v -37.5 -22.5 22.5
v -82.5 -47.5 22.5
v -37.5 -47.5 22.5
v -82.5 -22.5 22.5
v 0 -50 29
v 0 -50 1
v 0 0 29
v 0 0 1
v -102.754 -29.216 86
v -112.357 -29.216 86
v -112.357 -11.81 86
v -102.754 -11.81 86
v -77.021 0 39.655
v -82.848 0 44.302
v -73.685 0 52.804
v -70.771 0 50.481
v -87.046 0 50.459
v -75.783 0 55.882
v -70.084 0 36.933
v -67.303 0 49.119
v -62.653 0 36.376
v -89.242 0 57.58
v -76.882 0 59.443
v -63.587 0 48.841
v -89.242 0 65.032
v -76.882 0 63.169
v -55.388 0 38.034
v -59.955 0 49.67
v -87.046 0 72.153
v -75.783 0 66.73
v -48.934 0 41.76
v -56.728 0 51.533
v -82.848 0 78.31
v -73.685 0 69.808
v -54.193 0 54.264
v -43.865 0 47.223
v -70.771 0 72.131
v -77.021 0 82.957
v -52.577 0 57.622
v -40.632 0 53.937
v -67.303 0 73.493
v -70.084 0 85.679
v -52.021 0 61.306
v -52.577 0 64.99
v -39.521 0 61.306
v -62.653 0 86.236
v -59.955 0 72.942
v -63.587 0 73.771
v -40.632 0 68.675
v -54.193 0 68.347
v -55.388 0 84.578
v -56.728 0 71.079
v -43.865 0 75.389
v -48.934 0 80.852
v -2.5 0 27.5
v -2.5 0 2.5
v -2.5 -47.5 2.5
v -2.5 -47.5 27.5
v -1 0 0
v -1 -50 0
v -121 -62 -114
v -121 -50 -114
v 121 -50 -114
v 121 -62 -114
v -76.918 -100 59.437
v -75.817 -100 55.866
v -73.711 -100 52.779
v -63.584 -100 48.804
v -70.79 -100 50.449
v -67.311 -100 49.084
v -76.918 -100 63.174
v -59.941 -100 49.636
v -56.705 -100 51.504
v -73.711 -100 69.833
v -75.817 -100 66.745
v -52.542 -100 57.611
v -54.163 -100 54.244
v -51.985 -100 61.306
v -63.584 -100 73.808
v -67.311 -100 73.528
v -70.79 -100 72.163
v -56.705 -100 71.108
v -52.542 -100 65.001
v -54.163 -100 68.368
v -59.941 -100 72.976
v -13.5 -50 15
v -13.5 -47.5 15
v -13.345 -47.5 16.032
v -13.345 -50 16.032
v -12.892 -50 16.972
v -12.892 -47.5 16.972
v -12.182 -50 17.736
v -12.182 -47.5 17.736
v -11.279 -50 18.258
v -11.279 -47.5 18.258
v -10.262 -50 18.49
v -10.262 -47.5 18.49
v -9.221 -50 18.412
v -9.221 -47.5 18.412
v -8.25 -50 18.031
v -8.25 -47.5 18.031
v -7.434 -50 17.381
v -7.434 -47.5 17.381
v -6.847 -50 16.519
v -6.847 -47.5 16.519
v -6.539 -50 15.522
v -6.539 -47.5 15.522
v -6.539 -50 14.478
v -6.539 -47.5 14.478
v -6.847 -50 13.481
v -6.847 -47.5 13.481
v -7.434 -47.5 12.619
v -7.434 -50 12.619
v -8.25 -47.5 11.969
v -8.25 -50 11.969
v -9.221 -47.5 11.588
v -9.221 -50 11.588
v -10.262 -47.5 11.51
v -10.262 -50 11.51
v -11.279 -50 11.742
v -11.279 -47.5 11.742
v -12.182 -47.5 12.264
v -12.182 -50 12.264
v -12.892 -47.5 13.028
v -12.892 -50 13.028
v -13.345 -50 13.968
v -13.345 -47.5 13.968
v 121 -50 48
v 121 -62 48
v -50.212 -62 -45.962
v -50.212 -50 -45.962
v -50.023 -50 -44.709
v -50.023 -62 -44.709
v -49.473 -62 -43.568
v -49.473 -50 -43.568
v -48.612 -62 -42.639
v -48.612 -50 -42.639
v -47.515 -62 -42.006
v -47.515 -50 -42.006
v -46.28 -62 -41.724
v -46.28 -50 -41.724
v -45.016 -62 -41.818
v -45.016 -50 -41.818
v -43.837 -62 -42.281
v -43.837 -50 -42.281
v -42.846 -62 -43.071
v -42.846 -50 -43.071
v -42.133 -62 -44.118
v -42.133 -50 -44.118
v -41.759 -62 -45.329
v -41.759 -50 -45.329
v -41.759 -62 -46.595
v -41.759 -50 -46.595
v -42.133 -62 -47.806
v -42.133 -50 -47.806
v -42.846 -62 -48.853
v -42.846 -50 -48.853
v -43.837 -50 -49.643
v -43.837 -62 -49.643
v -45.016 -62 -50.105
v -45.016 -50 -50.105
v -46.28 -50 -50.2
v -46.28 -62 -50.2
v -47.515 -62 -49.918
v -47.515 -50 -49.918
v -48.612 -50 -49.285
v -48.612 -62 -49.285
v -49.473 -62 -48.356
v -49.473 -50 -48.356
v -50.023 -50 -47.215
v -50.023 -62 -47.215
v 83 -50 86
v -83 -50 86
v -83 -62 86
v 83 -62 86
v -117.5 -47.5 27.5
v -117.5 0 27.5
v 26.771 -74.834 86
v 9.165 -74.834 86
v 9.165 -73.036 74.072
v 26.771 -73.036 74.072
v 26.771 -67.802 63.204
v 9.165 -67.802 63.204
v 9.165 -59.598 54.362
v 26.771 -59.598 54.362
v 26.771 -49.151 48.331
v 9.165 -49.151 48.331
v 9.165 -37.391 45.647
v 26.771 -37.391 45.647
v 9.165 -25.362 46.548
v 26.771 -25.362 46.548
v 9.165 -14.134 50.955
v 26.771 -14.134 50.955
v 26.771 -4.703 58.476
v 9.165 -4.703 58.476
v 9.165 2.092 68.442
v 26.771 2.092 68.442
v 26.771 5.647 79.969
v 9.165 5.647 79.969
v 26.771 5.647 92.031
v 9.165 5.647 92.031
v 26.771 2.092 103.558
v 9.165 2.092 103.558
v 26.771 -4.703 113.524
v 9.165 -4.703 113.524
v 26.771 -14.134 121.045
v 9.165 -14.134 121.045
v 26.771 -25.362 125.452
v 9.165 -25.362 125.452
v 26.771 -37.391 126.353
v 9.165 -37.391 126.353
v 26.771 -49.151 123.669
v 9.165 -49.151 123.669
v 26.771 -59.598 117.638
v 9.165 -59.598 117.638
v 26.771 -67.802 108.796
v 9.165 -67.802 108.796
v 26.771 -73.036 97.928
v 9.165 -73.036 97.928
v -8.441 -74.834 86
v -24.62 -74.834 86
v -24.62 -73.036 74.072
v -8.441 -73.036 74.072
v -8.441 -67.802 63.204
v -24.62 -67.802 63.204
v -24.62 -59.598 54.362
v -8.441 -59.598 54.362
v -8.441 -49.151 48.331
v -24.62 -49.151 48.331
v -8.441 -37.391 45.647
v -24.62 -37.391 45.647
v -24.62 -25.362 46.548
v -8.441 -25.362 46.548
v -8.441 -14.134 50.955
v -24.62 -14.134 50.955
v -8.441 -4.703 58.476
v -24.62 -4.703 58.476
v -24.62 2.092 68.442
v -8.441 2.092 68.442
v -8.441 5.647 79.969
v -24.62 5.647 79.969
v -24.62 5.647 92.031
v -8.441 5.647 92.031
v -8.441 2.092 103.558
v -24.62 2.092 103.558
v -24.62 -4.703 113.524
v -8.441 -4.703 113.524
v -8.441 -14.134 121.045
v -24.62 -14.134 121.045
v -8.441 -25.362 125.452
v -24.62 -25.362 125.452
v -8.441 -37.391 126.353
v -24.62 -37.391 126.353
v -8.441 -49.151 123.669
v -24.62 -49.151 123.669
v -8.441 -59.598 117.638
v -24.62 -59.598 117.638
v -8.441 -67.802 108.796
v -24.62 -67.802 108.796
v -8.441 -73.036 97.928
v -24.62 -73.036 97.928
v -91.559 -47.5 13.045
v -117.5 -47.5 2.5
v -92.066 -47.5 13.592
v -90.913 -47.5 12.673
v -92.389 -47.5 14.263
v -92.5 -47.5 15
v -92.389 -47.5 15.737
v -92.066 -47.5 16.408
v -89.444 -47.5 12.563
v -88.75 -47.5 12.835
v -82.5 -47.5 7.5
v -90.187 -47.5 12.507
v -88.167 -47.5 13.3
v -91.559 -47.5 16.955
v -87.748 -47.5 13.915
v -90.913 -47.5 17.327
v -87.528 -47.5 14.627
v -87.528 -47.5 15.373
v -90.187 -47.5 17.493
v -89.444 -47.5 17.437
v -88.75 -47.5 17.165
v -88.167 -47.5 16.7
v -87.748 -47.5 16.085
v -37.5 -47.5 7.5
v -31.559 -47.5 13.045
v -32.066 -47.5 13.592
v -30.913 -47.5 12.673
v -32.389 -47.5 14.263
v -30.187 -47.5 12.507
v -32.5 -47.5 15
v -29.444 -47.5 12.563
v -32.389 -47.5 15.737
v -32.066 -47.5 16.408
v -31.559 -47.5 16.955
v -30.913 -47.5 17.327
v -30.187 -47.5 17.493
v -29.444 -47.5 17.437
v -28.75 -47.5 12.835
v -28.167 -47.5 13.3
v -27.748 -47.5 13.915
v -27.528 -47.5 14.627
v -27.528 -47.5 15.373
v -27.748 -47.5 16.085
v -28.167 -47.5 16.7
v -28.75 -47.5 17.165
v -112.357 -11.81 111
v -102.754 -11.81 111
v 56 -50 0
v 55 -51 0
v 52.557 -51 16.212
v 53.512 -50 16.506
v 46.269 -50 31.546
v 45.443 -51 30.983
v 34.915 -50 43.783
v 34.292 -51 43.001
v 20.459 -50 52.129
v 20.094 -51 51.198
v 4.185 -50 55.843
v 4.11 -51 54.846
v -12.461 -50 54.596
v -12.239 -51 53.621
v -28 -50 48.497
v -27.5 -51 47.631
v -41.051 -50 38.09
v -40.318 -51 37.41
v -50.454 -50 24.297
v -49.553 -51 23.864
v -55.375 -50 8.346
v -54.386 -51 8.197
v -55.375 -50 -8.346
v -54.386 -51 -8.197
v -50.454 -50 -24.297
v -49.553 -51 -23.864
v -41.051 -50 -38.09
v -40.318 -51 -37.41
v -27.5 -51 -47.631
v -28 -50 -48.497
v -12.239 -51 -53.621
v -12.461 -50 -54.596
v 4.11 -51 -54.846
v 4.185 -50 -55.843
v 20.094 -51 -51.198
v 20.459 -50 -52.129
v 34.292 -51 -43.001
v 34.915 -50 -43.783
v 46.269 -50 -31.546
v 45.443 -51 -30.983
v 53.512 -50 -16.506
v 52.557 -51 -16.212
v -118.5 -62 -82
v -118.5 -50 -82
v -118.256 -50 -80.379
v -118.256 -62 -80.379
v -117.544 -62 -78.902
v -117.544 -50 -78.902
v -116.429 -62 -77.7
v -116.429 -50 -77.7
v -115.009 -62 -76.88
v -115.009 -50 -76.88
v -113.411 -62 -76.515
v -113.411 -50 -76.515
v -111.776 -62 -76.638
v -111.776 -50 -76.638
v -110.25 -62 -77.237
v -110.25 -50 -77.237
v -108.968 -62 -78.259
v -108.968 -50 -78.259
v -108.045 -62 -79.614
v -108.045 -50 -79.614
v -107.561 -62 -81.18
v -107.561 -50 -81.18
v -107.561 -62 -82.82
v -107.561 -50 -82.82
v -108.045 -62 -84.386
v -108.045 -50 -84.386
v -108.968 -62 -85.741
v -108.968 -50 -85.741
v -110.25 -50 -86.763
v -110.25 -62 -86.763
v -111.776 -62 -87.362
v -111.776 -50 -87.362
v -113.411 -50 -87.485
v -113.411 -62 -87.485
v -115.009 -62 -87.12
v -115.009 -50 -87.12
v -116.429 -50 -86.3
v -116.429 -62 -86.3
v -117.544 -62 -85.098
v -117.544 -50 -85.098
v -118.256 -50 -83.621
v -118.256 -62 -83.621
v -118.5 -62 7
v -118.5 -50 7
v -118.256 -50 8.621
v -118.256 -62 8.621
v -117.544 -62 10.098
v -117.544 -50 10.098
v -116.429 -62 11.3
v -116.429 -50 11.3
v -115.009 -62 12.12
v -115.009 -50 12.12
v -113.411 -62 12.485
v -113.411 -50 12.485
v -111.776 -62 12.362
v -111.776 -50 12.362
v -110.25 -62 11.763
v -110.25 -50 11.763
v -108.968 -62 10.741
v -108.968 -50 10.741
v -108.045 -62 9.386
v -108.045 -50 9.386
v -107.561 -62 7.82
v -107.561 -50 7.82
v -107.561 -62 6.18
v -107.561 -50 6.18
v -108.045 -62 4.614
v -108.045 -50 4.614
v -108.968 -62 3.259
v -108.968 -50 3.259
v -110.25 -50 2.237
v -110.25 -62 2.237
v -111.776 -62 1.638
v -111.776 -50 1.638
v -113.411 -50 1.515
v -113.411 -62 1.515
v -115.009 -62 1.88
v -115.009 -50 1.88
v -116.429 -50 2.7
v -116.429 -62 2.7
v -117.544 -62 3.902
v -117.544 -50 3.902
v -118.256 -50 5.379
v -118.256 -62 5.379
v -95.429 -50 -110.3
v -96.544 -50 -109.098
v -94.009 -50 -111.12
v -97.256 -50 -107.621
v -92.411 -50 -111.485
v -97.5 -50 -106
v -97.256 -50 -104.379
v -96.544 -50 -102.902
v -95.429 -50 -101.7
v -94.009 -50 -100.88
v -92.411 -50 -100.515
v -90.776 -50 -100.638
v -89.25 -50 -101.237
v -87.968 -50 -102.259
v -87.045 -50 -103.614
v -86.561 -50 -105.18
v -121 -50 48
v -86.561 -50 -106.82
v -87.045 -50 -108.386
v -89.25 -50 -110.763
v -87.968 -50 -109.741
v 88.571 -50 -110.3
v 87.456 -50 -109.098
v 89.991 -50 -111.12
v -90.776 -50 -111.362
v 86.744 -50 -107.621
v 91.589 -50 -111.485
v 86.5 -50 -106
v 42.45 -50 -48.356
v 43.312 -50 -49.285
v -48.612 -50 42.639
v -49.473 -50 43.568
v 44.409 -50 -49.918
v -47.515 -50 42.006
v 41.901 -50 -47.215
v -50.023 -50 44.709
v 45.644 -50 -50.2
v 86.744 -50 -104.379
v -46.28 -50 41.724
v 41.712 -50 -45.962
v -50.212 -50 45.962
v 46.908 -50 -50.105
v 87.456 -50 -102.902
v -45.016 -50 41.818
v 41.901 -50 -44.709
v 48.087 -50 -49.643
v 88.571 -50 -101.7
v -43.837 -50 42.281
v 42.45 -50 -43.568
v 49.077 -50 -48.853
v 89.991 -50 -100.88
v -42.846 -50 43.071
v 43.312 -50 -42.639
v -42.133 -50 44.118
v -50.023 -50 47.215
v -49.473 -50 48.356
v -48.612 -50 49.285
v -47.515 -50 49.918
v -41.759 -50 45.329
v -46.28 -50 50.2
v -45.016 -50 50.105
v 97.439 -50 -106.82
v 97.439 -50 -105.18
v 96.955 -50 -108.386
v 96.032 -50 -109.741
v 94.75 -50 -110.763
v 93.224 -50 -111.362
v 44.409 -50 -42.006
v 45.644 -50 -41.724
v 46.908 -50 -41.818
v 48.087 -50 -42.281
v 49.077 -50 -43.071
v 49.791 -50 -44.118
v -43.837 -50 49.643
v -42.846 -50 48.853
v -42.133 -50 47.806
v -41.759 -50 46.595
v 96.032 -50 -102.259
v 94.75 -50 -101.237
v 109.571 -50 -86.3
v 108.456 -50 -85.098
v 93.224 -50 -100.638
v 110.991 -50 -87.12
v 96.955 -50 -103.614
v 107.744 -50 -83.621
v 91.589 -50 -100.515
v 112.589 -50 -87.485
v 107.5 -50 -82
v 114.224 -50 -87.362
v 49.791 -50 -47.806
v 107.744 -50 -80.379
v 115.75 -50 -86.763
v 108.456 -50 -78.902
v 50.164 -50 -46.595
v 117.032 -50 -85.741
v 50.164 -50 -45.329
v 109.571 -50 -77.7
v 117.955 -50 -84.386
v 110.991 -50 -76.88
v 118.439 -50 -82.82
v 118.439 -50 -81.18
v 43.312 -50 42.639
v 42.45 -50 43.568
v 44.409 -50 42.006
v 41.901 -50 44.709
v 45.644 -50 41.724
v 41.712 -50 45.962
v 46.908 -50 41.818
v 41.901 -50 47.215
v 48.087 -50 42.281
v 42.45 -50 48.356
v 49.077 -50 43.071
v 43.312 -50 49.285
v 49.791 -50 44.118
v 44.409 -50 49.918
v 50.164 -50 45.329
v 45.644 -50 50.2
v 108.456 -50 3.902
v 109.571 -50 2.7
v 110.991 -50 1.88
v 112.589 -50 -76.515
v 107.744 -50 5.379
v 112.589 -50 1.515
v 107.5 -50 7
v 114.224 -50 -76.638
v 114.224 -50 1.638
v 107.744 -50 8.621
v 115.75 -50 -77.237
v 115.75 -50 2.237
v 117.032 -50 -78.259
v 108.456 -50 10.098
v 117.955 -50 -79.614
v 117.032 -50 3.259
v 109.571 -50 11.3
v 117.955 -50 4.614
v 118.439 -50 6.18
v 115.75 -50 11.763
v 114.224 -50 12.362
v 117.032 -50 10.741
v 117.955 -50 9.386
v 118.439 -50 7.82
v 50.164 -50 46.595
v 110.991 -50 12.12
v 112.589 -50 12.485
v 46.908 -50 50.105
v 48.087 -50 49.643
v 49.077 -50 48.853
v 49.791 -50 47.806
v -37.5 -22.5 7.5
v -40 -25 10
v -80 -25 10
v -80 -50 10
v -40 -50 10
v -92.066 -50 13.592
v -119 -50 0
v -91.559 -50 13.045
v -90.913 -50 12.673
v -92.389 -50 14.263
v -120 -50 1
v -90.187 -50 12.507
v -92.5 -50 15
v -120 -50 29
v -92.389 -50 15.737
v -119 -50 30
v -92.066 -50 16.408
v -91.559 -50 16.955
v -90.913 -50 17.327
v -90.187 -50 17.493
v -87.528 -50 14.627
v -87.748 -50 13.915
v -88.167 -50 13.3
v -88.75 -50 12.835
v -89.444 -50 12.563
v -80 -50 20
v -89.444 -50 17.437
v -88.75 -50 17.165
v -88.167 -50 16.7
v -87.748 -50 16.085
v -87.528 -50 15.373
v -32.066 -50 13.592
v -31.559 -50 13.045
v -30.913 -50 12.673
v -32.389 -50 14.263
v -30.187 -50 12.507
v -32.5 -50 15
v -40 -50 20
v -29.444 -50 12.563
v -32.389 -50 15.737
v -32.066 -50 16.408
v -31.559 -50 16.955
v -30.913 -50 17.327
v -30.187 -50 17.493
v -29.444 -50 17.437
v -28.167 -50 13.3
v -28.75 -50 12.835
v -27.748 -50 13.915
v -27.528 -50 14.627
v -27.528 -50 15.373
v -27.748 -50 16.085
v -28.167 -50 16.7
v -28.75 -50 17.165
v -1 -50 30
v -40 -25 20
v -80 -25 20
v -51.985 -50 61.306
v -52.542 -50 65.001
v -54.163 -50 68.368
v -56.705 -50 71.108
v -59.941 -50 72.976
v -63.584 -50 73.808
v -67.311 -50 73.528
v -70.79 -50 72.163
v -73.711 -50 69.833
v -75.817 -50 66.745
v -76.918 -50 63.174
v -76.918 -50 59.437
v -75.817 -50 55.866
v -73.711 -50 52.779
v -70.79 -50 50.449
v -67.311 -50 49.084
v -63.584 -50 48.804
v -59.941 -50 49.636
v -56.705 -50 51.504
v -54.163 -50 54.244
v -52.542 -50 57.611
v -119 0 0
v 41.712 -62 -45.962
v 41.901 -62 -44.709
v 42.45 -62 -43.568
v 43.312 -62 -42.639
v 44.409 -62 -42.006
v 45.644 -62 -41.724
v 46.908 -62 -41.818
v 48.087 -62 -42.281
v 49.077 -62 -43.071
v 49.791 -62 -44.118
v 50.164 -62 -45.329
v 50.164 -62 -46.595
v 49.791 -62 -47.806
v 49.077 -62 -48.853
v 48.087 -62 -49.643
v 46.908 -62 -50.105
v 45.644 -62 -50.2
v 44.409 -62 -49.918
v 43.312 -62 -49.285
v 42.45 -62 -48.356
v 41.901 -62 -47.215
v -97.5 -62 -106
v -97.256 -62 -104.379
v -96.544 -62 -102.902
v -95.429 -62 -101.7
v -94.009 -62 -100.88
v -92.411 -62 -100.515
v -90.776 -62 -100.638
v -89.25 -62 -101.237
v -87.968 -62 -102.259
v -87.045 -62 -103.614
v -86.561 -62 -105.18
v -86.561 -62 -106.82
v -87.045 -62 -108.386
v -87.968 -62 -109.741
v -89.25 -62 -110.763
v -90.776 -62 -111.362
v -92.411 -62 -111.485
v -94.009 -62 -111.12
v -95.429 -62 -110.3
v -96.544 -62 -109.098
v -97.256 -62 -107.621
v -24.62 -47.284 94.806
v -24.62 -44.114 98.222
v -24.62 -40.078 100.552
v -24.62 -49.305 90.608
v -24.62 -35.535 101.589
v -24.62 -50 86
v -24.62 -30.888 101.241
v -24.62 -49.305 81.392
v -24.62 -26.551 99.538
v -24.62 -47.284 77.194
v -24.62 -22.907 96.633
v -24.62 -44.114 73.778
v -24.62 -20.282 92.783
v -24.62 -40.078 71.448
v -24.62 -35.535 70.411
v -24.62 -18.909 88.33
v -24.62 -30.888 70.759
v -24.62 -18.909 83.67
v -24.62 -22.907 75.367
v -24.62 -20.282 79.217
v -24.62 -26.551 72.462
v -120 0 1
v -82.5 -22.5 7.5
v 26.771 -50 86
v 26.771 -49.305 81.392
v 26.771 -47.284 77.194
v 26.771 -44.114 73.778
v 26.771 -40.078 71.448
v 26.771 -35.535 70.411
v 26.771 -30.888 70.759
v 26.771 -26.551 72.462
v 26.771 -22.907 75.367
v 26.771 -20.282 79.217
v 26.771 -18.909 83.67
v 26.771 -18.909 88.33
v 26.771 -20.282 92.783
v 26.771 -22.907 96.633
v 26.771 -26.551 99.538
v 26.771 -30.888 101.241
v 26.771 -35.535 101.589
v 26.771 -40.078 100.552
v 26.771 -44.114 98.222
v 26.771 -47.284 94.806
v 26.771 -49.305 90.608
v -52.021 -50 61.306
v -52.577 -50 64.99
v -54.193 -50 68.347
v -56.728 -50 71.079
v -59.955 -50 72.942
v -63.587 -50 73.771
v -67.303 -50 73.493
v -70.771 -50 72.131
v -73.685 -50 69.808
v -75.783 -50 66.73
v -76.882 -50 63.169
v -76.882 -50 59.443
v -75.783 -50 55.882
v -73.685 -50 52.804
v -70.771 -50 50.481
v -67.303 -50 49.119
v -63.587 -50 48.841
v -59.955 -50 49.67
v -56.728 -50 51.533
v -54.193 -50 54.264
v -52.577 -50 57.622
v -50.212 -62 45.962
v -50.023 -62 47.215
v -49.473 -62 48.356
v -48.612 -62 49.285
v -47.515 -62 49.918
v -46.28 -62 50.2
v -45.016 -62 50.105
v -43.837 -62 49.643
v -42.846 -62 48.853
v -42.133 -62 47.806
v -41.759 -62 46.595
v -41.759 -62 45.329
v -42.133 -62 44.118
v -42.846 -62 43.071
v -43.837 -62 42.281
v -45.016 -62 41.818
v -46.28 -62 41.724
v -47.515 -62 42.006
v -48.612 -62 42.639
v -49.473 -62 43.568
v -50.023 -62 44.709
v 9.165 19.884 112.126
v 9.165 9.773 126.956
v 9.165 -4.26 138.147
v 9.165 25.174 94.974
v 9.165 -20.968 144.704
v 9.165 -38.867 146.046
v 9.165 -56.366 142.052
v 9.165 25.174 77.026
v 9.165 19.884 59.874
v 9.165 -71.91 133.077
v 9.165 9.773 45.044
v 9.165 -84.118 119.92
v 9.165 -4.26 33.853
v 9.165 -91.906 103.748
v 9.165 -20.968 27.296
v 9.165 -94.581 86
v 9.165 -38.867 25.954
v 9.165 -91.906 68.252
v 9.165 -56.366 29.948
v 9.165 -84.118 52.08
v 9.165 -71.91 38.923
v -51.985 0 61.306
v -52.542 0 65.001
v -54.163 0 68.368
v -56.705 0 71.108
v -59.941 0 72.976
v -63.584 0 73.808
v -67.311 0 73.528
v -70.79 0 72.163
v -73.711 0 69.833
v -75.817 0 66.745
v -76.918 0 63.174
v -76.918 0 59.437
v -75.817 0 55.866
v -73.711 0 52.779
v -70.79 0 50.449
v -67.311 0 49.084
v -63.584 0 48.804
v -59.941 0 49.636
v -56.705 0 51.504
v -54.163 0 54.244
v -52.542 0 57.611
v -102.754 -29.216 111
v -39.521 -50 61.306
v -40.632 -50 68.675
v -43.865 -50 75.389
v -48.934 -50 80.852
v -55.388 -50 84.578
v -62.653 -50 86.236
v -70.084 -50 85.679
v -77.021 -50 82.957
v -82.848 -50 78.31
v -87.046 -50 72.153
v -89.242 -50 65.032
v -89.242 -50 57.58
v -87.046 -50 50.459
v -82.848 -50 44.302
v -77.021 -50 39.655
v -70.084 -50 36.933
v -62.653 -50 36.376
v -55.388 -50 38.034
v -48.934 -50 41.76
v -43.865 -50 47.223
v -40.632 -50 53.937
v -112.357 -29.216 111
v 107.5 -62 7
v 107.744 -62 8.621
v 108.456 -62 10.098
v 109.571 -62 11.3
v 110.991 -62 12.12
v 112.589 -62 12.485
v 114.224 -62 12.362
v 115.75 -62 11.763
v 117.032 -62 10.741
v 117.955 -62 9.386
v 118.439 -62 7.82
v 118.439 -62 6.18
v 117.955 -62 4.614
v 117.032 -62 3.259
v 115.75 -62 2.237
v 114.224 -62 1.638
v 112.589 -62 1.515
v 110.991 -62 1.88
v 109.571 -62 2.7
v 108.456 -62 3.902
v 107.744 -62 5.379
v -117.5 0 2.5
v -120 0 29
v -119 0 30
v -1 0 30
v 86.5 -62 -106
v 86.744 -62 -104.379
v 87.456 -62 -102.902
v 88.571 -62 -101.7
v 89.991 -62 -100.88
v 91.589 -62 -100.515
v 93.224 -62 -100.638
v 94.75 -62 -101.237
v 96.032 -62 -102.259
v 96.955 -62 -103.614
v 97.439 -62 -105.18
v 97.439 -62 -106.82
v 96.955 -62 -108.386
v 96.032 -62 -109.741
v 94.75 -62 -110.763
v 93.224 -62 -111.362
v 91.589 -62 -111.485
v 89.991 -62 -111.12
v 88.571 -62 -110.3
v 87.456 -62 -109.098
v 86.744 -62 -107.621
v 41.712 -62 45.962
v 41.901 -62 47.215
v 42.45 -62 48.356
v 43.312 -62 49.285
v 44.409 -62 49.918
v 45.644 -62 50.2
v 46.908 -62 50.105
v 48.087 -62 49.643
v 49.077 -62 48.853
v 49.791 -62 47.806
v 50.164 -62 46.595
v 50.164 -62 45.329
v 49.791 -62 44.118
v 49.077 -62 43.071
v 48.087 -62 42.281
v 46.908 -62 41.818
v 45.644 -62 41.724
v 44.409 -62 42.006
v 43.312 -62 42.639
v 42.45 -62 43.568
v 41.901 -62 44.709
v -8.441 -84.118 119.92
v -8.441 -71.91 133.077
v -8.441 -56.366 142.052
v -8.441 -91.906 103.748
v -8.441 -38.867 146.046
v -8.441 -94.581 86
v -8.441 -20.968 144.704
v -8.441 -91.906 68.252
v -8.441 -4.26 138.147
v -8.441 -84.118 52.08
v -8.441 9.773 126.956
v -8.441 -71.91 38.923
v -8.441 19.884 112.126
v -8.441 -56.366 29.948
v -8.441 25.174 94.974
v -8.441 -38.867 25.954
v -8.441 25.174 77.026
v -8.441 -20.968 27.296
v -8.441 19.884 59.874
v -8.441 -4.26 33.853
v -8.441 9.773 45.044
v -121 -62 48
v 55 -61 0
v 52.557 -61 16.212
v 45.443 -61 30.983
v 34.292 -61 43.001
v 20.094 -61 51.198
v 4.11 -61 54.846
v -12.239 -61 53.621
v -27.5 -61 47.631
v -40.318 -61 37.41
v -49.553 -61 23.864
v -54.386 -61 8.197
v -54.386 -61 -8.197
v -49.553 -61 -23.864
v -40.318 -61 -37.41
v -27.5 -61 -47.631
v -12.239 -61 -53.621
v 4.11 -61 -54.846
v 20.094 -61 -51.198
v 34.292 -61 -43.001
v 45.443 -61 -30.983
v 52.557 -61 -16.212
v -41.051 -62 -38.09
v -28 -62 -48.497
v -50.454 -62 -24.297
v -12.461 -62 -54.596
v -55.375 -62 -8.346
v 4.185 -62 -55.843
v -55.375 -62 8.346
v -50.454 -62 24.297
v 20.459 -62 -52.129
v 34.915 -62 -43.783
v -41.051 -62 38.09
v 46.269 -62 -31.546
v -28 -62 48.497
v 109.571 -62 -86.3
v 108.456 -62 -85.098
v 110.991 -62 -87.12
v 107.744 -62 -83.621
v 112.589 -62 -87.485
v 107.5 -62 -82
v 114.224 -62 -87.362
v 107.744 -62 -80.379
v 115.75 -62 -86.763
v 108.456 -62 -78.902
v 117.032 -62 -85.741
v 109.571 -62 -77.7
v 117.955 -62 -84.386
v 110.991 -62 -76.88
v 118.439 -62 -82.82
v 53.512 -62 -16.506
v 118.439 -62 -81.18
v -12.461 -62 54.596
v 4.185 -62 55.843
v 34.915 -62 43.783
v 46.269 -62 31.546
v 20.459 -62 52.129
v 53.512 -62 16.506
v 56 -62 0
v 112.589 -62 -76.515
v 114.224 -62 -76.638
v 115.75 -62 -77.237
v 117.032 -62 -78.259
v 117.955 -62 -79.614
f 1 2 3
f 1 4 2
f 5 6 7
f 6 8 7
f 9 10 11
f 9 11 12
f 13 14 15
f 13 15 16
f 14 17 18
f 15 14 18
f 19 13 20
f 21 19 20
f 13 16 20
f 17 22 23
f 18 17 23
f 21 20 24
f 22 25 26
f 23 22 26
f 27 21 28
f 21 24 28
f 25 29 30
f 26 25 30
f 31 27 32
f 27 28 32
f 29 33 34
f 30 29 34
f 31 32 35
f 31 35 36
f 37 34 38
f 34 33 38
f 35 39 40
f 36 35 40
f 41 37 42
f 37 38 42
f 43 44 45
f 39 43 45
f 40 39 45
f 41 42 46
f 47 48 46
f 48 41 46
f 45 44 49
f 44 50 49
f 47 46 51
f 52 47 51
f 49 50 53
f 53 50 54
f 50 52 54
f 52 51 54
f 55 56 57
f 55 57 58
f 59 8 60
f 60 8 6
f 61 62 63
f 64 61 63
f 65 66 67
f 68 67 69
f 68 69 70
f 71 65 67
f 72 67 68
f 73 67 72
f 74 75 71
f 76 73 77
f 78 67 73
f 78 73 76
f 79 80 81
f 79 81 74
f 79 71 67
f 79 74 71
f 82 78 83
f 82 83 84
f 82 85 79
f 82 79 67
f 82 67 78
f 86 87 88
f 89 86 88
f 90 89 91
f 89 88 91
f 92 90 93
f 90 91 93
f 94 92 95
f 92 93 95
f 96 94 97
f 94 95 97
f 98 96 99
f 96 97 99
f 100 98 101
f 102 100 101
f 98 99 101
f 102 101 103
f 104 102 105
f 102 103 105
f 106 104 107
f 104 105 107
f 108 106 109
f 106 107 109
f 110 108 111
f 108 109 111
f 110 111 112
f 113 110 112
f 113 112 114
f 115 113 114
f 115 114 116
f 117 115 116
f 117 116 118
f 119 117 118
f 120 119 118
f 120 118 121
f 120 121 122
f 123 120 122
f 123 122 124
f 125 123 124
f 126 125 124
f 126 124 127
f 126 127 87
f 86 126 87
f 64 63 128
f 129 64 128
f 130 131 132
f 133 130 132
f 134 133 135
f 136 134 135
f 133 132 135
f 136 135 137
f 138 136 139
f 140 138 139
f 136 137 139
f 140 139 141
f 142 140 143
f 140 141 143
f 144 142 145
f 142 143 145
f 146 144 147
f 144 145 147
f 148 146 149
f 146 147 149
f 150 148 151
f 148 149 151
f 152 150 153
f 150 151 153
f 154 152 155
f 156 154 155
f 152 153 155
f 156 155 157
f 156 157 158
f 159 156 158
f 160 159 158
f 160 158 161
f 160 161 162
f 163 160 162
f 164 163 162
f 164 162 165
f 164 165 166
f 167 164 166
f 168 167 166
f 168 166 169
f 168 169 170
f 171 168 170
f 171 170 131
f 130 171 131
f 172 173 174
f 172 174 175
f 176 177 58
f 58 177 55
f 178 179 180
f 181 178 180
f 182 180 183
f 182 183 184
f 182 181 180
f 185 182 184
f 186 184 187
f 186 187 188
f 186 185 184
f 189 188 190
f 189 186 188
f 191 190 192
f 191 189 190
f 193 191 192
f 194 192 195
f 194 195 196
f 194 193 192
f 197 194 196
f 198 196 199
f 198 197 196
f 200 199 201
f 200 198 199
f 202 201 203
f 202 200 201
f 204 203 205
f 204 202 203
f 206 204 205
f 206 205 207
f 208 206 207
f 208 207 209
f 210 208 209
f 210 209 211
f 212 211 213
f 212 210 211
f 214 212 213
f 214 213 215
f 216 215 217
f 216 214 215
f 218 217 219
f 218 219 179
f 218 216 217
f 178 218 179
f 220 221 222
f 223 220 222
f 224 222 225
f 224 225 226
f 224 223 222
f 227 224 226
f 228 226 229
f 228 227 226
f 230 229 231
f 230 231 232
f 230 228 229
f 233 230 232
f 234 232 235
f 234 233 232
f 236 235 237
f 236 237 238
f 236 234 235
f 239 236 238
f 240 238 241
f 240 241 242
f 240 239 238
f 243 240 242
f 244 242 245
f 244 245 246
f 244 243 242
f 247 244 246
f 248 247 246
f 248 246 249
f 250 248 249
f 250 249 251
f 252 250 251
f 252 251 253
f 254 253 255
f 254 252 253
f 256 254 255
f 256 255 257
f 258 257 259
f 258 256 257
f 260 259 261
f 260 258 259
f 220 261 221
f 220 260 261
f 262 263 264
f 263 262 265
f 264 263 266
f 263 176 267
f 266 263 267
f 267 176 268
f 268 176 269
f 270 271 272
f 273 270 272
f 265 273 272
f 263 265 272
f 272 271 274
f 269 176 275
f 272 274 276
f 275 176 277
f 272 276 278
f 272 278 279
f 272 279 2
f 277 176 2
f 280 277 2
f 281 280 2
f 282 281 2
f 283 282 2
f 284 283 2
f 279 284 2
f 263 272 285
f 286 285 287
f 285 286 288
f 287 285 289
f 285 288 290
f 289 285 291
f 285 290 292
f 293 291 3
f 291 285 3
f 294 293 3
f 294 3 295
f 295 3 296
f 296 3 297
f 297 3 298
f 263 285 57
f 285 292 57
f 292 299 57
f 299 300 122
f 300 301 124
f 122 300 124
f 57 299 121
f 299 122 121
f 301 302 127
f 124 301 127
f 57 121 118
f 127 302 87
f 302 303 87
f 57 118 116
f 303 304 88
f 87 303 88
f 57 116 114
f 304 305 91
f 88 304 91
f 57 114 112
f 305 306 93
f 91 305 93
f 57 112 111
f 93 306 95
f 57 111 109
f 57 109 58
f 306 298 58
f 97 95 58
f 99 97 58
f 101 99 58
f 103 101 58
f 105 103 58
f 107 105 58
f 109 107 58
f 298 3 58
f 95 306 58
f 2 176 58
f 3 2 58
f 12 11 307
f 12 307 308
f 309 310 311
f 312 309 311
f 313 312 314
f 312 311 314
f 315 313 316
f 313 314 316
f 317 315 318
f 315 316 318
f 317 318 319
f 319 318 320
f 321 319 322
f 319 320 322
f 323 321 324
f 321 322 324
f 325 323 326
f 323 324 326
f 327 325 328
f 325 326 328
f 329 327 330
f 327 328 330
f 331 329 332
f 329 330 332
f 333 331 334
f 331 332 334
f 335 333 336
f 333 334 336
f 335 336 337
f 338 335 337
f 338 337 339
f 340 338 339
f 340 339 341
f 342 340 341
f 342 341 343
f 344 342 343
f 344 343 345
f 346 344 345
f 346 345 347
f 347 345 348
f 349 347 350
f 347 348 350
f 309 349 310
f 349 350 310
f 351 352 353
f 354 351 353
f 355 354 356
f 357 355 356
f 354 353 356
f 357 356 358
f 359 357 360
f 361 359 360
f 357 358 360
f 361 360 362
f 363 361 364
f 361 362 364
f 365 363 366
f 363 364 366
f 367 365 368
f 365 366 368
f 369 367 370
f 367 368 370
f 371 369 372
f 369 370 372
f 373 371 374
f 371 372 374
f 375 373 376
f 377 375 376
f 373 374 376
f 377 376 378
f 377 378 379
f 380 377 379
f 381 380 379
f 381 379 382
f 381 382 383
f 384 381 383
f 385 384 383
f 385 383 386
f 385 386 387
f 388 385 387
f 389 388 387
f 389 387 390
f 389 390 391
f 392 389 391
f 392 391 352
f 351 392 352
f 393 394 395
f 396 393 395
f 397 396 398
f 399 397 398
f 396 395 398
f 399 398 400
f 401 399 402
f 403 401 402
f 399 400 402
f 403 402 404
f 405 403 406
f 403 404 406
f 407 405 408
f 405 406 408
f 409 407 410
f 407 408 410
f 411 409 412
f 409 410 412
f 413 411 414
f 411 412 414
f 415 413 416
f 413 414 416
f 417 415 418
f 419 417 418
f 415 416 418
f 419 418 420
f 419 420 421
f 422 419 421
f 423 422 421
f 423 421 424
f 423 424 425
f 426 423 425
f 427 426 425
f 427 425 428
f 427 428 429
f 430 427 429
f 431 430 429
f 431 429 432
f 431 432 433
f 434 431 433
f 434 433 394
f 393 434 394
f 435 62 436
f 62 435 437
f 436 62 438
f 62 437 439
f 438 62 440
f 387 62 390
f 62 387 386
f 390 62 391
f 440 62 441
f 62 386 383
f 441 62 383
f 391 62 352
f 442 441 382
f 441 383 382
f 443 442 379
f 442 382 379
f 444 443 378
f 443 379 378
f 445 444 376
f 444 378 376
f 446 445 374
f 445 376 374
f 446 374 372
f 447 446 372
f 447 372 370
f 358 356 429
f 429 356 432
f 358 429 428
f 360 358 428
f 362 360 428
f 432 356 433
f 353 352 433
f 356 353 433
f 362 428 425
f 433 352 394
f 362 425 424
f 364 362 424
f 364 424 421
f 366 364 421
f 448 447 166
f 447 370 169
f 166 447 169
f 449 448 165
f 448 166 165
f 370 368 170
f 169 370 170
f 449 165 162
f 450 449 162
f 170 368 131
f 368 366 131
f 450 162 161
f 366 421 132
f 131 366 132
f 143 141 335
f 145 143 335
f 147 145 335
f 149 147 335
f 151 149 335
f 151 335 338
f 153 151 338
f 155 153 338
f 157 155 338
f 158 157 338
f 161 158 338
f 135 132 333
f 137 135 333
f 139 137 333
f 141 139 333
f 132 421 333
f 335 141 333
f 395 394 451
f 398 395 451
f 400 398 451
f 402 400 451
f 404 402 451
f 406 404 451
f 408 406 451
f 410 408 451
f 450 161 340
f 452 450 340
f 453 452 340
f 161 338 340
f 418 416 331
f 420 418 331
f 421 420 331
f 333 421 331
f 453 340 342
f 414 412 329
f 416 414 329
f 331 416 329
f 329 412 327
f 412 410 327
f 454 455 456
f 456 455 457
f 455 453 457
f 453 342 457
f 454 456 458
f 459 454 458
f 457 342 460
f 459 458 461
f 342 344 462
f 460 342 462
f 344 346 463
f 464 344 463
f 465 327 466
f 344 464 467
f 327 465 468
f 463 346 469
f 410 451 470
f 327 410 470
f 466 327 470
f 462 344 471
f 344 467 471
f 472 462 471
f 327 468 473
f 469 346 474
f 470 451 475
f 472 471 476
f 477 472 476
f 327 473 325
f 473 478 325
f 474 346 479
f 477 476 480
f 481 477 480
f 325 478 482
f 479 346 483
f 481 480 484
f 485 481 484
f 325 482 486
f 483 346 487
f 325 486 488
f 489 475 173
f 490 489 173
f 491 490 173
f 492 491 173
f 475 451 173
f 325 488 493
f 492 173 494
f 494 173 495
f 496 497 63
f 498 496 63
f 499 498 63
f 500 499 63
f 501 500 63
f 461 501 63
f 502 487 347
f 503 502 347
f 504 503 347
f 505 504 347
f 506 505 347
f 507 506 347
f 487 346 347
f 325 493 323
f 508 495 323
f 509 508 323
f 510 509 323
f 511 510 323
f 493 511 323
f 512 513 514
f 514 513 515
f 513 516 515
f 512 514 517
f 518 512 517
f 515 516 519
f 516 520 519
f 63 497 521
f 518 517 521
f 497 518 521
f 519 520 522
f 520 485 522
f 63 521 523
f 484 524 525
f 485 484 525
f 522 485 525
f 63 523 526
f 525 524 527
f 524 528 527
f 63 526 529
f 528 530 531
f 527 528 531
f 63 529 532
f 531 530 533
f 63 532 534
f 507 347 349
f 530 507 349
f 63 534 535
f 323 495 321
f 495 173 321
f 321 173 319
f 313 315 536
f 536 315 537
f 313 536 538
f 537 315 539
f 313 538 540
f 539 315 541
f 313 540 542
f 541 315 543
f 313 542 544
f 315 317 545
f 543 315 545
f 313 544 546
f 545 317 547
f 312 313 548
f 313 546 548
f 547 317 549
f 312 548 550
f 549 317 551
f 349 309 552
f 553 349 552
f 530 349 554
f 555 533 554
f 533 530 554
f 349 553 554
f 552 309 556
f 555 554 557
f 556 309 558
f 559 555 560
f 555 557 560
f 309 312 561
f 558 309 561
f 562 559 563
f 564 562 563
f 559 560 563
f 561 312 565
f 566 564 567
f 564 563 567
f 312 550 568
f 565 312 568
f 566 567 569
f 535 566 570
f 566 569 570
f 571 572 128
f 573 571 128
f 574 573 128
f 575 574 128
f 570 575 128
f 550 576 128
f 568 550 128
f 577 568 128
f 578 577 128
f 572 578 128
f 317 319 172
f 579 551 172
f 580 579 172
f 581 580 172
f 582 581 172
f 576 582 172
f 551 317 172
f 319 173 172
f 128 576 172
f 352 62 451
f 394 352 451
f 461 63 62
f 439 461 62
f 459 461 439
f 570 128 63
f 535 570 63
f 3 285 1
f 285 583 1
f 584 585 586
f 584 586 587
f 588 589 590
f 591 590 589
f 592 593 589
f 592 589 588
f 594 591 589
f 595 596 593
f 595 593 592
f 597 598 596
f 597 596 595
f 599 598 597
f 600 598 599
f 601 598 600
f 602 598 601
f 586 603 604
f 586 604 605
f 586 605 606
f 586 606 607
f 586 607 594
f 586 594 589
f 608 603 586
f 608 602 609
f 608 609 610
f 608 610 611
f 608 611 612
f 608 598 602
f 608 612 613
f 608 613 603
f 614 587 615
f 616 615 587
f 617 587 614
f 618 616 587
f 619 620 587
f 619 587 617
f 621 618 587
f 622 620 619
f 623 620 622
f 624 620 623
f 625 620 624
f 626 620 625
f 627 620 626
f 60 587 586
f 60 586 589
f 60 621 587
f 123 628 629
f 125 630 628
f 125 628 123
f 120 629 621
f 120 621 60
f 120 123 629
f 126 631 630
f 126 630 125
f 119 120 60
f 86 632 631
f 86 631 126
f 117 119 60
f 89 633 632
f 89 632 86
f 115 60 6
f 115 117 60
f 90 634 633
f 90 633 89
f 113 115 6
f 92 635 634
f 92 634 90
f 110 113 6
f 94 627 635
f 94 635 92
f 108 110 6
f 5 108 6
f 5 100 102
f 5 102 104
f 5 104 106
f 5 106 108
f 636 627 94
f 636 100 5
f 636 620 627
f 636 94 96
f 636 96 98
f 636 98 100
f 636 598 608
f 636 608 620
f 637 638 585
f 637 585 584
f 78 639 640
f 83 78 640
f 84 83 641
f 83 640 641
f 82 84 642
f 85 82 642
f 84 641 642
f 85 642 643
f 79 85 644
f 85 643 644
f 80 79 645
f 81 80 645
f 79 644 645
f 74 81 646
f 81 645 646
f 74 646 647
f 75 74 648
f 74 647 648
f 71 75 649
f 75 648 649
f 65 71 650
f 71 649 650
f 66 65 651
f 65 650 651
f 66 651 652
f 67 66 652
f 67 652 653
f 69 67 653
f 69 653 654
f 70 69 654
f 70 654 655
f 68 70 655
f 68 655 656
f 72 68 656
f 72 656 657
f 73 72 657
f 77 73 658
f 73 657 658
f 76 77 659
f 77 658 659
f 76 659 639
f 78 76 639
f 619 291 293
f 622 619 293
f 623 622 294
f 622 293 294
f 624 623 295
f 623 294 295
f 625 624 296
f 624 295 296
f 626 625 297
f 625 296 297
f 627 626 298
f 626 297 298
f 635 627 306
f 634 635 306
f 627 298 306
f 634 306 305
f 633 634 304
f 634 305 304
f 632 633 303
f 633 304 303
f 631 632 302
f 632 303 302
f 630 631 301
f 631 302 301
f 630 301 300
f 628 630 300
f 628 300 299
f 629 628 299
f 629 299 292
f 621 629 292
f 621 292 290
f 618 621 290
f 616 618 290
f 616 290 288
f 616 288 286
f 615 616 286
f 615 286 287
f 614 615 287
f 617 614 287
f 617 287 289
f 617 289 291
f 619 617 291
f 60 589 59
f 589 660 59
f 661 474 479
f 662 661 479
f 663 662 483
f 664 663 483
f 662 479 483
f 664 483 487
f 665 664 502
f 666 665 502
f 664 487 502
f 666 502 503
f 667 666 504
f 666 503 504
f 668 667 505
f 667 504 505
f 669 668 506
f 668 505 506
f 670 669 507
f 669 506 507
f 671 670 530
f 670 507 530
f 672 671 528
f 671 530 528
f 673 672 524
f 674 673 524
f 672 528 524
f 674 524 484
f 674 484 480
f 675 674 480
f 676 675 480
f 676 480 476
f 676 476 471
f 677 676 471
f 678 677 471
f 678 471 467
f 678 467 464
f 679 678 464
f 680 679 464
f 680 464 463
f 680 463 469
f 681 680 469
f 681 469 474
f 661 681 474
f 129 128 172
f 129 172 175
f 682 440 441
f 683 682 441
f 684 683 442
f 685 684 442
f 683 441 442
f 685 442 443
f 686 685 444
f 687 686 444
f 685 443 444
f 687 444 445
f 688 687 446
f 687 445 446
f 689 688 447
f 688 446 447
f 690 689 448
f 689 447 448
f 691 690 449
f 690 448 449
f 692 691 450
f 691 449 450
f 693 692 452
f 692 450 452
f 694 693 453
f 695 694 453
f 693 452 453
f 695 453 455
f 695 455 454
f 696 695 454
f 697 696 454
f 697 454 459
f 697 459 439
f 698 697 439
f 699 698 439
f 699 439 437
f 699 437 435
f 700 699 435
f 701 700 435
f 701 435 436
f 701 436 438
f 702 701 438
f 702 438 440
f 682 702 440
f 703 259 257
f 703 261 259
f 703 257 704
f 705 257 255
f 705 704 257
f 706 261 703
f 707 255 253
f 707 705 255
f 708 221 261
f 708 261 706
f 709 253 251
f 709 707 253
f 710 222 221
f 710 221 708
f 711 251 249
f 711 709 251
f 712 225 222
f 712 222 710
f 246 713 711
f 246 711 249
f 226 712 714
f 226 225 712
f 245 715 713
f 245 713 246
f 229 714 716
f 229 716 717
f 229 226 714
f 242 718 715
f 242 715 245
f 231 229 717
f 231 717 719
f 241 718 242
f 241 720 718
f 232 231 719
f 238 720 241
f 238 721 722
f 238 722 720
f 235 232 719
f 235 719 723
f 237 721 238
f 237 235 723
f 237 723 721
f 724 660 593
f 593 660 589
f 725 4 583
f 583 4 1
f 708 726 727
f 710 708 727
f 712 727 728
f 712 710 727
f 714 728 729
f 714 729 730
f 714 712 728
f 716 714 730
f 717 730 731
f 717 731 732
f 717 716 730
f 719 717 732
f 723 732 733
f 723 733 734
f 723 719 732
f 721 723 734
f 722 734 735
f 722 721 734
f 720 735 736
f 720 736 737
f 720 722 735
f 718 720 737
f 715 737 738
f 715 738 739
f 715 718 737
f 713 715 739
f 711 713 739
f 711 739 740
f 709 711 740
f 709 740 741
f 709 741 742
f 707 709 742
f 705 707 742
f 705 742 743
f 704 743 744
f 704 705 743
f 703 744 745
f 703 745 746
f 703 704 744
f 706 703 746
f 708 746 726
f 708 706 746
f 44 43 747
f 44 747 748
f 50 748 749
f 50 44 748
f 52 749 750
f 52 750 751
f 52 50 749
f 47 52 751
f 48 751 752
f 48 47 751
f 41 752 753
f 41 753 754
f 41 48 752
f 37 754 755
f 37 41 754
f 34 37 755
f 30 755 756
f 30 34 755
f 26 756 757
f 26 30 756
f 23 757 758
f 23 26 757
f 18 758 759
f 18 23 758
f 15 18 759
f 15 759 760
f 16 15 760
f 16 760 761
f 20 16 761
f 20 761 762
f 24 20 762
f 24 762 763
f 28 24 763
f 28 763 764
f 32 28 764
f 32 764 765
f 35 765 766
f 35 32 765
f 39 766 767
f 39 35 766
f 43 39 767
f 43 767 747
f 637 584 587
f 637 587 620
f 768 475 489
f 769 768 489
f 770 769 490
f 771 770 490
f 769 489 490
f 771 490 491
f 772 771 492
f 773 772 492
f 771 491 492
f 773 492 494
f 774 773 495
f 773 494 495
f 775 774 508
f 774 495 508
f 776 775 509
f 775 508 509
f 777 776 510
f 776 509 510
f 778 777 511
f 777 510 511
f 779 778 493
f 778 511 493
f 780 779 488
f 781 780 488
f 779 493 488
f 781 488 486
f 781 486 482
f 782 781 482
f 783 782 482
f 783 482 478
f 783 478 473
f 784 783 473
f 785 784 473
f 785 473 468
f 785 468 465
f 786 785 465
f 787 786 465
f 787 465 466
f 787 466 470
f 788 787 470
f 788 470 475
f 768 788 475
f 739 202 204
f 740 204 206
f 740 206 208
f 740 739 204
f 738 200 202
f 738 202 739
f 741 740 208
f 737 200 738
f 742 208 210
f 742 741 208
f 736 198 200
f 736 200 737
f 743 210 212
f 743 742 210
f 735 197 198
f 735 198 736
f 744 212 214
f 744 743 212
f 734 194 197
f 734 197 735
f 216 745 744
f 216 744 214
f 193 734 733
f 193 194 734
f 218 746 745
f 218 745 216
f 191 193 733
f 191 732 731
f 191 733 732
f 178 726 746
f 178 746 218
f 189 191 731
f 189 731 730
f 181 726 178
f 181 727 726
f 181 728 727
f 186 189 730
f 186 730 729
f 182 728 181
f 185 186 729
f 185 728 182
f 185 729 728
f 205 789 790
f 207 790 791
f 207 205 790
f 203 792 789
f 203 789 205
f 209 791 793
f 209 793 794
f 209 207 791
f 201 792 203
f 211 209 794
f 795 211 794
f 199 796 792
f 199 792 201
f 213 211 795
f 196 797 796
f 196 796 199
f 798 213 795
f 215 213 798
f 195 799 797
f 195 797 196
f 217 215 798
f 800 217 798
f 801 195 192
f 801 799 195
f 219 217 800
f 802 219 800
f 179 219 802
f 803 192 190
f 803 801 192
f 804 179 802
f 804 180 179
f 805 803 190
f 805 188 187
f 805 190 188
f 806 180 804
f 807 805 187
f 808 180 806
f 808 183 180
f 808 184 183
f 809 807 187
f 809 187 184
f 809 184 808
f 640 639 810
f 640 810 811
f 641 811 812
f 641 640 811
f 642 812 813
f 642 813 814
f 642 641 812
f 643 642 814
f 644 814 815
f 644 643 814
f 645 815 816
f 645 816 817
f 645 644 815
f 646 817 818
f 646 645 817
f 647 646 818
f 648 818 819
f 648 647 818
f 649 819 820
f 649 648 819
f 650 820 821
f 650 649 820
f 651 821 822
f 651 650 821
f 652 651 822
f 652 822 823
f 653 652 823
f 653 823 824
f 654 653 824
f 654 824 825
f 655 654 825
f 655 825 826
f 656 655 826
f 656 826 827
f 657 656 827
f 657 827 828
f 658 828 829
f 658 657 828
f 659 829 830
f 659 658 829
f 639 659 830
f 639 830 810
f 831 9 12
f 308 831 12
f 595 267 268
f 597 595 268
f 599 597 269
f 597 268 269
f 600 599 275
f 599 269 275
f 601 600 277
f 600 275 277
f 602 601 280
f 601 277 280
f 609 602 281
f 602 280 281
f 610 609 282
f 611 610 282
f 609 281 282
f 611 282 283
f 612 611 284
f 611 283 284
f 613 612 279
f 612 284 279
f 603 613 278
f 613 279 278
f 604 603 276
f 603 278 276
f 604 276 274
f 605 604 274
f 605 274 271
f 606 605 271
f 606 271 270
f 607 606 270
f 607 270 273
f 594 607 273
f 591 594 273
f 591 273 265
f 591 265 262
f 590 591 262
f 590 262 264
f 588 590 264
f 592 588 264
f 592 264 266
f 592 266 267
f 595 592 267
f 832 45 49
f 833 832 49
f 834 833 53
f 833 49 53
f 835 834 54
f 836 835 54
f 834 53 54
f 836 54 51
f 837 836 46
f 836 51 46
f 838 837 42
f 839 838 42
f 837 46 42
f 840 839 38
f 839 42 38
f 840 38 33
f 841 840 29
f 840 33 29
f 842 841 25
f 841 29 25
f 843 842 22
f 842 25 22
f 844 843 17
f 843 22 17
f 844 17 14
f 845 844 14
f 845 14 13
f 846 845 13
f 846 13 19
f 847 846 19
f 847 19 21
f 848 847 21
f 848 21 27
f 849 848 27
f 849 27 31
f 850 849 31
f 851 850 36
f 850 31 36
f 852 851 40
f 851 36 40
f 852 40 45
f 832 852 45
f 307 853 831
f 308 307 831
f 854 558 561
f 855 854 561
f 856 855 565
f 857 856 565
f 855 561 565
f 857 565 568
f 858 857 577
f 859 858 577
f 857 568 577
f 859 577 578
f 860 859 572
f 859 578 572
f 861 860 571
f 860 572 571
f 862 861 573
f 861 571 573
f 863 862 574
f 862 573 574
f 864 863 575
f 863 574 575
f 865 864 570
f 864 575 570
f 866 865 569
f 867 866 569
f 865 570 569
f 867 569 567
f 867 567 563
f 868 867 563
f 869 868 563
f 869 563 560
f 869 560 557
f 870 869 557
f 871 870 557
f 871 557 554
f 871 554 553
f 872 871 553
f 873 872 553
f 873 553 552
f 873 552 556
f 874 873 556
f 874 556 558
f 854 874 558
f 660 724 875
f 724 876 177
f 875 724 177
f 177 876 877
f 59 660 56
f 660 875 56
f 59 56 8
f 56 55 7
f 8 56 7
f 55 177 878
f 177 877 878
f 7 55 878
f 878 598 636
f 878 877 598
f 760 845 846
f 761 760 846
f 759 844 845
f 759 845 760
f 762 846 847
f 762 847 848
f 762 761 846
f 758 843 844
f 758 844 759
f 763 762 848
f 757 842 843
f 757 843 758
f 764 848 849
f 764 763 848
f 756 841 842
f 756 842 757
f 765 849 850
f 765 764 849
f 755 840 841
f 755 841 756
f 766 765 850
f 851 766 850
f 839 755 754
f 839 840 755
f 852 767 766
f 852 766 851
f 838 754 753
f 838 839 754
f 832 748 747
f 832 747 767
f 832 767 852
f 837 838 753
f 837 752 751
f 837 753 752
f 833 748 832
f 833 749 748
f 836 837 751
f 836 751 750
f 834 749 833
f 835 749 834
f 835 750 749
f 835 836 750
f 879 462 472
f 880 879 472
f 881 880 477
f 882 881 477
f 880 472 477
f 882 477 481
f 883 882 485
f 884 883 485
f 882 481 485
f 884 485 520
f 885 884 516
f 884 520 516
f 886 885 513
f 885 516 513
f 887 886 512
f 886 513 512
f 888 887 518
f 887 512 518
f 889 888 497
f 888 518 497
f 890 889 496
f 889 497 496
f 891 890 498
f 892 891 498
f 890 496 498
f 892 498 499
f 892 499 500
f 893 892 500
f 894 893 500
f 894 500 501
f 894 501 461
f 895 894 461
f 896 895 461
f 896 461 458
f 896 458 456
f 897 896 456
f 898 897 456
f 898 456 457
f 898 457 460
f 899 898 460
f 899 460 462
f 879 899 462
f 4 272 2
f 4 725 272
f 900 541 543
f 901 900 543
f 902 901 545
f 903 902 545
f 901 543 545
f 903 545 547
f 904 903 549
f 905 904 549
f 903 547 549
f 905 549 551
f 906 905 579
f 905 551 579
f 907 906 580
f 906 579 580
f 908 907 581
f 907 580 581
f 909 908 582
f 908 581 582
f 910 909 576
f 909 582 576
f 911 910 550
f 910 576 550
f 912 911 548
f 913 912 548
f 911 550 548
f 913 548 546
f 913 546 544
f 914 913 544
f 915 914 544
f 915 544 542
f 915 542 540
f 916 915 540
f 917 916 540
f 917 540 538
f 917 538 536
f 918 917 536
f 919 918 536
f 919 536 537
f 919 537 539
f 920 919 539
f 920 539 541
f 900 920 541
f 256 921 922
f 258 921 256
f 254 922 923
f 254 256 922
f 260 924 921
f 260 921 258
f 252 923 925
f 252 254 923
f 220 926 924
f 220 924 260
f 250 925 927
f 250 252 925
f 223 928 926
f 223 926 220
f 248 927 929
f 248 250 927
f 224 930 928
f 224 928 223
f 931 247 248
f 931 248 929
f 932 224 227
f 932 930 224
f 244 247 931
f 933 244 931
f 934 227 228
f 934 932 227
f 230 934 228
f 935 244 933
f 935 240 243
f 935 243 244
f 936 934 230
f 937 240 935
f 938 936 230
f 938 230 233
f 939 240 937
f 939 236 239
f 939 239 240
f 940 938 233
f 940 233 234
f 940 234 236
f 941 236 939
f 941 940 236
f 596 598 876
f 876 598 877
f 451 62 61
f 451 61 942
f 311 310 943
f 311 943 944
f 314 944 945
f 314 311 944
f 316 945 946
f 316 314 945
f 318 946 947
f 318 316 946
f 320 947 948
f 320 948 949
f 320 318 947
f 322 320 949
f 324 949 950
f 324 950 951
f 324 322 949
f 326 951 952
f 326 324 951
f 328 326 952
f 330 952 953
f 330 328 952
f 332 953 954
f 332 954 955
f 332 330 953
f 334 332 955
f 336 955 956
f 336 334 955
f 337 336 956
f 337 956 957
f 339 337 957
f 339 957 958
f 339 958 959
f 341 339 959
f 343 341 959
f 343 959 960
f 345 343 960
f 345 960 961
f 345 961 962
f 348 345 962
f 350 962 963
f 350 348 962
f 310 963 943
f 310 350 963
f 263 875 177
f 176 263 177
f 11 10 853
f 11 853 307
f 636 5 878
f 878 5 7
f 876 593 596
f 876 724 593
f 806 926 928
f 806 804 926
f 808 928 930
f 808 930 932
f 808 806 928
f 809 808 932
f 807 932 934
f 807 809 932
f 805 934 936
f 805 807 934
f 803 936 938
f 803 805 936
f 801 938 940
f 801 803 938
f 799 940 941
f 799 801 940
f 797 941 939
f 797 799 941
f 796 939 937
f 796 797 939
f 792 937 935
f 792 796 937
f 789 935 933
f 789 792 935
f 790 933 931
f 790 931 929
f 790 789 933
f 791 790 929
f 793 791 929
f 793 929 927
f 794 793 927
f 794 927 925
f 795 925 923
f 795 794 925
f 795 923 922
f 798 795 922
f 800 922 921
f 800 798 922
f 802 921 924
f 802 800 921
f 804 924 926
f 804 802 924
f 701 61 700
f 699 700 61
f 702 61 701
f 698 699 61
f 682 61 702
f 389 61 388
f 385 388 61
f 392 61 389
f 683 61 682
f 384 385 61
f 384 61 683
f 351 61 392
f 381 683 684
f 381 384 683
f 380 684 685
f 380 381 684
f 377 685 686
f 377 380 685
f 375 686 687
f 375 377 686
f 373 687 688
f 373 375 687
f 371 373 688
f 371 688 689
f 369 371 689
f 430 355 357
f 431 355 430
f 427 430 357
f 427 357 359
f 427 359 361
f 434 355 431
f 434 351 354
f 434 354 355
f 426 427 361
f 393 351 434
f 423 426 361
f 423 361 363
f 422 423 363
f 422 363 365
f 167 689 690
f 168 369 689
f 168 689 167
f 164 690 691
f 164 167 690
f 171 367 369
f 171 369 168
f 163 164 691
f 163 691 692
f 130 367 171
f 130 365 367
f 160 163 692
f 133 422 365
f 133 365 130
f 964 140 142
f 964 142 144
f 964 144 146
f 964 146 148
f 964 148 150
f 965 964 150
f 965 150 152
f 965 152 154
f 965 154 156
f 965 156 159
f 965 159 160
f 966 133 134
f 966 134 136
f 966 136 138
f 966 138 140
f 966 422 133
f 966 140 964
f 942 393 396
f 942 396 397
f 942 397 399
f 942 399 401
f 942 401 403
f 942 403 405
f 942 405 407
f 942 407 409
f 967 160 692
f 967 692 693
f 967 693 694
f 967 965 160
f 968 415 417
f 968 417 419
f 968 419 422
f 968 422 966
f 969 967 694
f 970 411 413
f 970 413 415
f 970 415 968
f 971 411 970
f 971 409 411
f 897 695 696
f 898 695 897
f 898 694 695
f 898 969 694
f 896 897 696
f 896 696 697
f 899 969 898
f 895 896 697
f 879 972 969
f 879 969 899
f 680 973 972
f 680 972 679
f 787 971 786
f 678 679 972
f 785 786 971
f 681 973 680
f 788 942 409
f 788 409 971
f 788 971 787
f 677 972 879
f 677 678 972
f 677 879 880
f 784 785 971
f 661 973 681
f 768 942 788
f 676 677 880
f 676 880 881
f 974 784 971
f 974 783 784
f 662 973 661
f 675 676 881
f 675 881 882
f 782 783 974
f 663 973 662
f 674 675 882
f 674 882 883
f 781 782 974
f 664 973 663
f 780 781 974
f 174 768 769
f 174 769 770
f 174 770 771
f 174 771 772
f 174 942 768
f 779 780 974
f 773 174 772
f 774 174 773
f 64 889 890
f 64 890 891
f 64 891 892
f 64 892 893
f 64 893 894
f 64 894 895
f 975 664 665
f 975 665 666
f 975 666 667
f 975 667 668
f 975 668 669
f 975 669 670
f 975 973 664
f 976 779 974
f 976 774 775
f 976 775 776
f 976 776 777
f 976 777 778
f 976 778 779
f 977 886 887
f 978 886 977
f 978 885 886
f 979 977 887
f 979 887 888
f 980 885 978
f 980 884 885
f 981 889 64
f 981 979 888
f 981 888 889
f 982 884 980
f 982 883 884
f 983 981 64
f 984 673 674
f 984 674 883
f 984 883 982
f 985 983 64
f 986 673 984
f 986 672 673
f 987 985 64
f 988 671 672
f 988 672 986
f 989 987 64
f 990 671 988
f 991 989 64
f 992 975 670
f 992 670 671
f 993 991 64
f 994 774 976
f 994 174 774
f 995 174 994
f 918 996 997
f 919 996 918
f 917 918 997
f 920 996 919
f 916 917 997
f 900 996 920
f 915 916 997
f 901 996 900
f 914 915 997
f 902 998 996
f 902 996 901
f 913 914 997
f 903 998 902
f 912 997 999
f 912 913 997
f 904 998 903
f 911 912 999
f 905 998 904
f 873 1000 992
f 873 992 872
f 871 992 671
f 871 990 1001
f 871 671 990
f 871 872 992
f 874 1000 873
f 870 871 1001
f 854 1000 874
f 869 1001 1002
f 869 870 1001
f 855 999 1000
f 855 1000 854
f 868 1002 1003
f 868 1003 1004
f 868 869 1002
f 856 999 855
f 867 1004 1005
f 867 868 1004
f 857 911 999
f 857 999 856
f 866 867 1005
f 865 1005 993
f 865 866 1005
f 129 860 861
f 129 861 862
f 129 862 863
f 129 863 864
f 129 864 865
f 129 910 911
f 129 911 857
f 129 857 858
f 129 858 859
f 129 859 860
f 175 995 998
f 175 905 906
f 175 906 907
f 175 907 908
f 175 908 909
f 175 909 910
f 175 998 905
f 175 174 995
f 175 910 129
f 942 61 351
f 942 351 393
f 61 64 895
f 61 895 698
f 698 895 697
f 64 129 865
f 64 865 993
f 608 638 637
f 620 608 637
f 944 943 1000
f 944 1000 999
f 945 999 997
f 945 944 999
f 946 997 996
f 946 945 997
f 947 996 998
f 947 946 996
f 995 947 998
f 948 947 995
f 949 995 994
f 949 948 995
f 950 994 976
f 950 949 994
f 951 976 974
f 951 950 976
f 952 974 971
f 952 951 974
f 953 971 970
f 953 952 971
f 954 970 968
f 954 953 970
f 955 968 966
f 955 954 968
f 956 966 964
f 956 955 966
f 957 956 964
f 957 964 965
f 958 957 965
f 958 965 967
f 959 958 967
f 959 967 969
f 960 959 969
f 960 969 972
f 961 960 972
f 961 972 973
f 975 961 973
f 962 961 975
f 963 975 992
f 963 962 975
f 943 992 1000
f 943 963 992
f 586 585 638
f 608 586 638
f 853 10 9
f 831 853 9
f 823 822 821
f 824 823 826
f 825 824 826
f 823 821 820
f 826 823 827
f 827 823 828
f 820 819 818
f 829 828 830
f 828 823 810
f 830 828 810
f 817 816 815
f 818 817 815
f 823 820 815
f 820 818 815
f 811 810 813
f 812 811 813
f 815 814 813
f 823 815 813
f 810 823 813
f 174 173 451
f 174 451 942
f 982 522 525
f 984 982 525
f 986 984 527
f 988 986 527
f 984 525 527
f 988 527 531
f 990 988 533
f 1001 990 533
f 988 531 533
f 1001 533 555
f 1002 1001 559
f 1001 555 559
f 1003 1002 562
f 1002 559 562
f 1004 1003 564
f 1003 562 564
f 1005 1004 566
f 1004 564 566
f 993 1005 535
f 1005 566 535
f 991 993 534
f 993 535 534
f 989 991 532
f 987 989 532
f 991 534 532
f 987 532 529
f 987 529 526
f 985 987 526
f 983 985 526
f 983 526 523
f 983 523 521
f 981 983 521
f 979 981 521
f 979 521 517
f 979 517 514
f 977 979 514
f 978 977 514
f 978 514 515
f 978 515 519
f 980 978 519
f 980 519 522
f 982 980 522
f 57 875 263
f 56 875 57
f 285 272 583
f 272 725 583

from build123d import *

# Parameters (mm, degrees)
F0_W           = 120
F0_H           = 30
F1_DEPTH       = 25
F2_W           = 120
F2_H           = 30
F2_W_2         = 40
F2_H_2         = 10
F3_DEPTH       = 25
F4_T           = -2.5
F6_D           = 5
F7_D           = 7
F8_SIZE        = 1
F9_R           = 25
F9_R_2         = 12.5
F10_DEPTH      = 50
F13_R          = 12.5366828167
F14_DEPTH      = 50
F14_DEPTH_BACK = 50
F15_W          = 242
F15_H          = 200
F15_R          = 55
F16_DEPTH      = 12
F17_SIZE       = 38
F19_D          = 8.5
F21_D          = 11
F22_SIZE       = 1
F23_W          = 9.6032470465
F23_H          = 17.4058834091
F24_DEPTH      = 25


with BuildPart() as f1:
    # F0 (on Front) → F1 (new body)
    with BuildSketch(Plane.XZ):
        with Locations((-60, 15)):
            Rectangle(F0_W, F0_H)
    extrude(amount=F1_DEPTH)

    # F2 (on face) → F3 (join)
    with BuildSketch(Plane.XZ.offset(25)):
        with Locations((-60, 15)):
            Rectangle(F2_W, F2_H)
        with Locations((-60, 15)):
            Rectangle(F2_W_2, F2_H_2, mode=Mode.SUBTRACT)
    extrude(amount=F3_DEPTH)

    # F4
    f4_openings = [f1.faces().sort_by_distance(p)[0] for p in [
        (-60, 0, 15),
    ]]
    offset(amount=F4_T, openings=f4_openings, kind=Kind.INTERSECTION)

    # F6 (through all)
    with Locations(Plane.XZ.offset(50)):
        with Locations((-90, 15), (-30, 15)):
            Hole(F6_D / 2)

    # F7 (through all)
    with Locations(Plane.XZ.offset(50)):
        with Locations((-10, 15)):
            Hole(F7_D / 2)

    # F8
    f8_edges = [f1.edges().sort_by_distance(p)[0] for p in [
        (-120, -25, 30),
        (-120, -25, 0),
        (0, -25, 30),
        (0, -25, 0),
    ]]
    chamfer(f8_edges, length=F8_SIZE)


with BuildPart() as f10:
    # F9 (on Front) → F10 (new body)
    with BuildSketch(Plane.XZ):
        with Locations((-64.5213648677, 61.3059587777)):
            Circle(F9_R)
        with Locations((-64.5213648677, 61.3059587777)):
            Circle(F9_R_2, mode=Mode.SUBTRACT)
    extrude(amount=F10_DEPTH)


with BuildPart() as f14:
    # F13 (on offset) → F14 (new body, two sides)
    with BuildSketch(Plane.XZ.offset(50)) as f14_sk:
        with Locations((-64.5213648677, 61.3059587777)):
            Circle(F13_R)
    extrude(amount=-F14_DEPTH)
    extrude(f14_sk.sketch, amount=F14_DEPTH_BACK)


with BuildPart() as f16:
    # F15 (on offset) → F16 (new body)
    with BuildSketch(Plane.XZ.offset(50)):
        with Locations((0, -14)):
            Rectangle(F15_W, F15_H)
        Circle(F15_R, mode=Mode.SUBTRACT)
    extrude(amount=F16_DEPTH)

    # F17
    f17_edges = [f16.edges().sort_by_distance(p)[0] for p in [
        (-121, -56, 86),
        (121, -56, 86),
    ]]
    chamfer(f17_edges, length=F17_SIZE)

    # F19 (through all)
    with Locations(Plane.XZ.offset(62)):
        with Locations((-45.9619407771, 45.9619407771), (45.9619407771, 45.9619407771), (45.9619407771, -45.9619407771), (-45.9619407771, -45.9619407771)):
            Hole(F19_D / 2)

    # F21 (through all)
    with Locations(Plane.XZ.offset(62)):
        with Locations((-113, 7), (113, 7), (113, -82), (92, -106), (-92, -106), (-113, -82)):
            Hole(F21_D / 2)

    # F22
    f22_edges = [f16.edges().sort_by_distance(p)[0] for p in [
        (-55, -62, 0),
        (-55, -50, 0),
    ]]
    chamfer(f22_edges, length=F22_SIZE)


with BuildPart() as f24:
    # F23 (on face) → F24 (new body)
    with BuildSketch(Plane.XY.offset(86)):
        with Locations((-107.555270195, -20.5133124255)):
            Rectangle(F23_W, F23_H)
    extrude(amount=F24_DEPTH)


with BuildPart() as f26:
    # F25 (on face) → F26 (revolve)
    with BuildSketch(Plane.XY.offset(86)):
        Polygon((26.7714690417, -50), (-24.6196500957, -50), (-24.6196500957, -74.833586812), (-8.4409639239, -74.833586812), (-8.4409639239, -94.581104815), (9.1652534902, -94.581104815), (9.1652534902, -74.833586812), (26.7714690417, -74.833586812), align=None)
    revolve(axis=Axis((1.0507404804, -34.3671105802, 86), (1, 0, 0)))


solid = Compound([f1.part, f10.part, f14.part, f16.part, f24.part, f26.part])
